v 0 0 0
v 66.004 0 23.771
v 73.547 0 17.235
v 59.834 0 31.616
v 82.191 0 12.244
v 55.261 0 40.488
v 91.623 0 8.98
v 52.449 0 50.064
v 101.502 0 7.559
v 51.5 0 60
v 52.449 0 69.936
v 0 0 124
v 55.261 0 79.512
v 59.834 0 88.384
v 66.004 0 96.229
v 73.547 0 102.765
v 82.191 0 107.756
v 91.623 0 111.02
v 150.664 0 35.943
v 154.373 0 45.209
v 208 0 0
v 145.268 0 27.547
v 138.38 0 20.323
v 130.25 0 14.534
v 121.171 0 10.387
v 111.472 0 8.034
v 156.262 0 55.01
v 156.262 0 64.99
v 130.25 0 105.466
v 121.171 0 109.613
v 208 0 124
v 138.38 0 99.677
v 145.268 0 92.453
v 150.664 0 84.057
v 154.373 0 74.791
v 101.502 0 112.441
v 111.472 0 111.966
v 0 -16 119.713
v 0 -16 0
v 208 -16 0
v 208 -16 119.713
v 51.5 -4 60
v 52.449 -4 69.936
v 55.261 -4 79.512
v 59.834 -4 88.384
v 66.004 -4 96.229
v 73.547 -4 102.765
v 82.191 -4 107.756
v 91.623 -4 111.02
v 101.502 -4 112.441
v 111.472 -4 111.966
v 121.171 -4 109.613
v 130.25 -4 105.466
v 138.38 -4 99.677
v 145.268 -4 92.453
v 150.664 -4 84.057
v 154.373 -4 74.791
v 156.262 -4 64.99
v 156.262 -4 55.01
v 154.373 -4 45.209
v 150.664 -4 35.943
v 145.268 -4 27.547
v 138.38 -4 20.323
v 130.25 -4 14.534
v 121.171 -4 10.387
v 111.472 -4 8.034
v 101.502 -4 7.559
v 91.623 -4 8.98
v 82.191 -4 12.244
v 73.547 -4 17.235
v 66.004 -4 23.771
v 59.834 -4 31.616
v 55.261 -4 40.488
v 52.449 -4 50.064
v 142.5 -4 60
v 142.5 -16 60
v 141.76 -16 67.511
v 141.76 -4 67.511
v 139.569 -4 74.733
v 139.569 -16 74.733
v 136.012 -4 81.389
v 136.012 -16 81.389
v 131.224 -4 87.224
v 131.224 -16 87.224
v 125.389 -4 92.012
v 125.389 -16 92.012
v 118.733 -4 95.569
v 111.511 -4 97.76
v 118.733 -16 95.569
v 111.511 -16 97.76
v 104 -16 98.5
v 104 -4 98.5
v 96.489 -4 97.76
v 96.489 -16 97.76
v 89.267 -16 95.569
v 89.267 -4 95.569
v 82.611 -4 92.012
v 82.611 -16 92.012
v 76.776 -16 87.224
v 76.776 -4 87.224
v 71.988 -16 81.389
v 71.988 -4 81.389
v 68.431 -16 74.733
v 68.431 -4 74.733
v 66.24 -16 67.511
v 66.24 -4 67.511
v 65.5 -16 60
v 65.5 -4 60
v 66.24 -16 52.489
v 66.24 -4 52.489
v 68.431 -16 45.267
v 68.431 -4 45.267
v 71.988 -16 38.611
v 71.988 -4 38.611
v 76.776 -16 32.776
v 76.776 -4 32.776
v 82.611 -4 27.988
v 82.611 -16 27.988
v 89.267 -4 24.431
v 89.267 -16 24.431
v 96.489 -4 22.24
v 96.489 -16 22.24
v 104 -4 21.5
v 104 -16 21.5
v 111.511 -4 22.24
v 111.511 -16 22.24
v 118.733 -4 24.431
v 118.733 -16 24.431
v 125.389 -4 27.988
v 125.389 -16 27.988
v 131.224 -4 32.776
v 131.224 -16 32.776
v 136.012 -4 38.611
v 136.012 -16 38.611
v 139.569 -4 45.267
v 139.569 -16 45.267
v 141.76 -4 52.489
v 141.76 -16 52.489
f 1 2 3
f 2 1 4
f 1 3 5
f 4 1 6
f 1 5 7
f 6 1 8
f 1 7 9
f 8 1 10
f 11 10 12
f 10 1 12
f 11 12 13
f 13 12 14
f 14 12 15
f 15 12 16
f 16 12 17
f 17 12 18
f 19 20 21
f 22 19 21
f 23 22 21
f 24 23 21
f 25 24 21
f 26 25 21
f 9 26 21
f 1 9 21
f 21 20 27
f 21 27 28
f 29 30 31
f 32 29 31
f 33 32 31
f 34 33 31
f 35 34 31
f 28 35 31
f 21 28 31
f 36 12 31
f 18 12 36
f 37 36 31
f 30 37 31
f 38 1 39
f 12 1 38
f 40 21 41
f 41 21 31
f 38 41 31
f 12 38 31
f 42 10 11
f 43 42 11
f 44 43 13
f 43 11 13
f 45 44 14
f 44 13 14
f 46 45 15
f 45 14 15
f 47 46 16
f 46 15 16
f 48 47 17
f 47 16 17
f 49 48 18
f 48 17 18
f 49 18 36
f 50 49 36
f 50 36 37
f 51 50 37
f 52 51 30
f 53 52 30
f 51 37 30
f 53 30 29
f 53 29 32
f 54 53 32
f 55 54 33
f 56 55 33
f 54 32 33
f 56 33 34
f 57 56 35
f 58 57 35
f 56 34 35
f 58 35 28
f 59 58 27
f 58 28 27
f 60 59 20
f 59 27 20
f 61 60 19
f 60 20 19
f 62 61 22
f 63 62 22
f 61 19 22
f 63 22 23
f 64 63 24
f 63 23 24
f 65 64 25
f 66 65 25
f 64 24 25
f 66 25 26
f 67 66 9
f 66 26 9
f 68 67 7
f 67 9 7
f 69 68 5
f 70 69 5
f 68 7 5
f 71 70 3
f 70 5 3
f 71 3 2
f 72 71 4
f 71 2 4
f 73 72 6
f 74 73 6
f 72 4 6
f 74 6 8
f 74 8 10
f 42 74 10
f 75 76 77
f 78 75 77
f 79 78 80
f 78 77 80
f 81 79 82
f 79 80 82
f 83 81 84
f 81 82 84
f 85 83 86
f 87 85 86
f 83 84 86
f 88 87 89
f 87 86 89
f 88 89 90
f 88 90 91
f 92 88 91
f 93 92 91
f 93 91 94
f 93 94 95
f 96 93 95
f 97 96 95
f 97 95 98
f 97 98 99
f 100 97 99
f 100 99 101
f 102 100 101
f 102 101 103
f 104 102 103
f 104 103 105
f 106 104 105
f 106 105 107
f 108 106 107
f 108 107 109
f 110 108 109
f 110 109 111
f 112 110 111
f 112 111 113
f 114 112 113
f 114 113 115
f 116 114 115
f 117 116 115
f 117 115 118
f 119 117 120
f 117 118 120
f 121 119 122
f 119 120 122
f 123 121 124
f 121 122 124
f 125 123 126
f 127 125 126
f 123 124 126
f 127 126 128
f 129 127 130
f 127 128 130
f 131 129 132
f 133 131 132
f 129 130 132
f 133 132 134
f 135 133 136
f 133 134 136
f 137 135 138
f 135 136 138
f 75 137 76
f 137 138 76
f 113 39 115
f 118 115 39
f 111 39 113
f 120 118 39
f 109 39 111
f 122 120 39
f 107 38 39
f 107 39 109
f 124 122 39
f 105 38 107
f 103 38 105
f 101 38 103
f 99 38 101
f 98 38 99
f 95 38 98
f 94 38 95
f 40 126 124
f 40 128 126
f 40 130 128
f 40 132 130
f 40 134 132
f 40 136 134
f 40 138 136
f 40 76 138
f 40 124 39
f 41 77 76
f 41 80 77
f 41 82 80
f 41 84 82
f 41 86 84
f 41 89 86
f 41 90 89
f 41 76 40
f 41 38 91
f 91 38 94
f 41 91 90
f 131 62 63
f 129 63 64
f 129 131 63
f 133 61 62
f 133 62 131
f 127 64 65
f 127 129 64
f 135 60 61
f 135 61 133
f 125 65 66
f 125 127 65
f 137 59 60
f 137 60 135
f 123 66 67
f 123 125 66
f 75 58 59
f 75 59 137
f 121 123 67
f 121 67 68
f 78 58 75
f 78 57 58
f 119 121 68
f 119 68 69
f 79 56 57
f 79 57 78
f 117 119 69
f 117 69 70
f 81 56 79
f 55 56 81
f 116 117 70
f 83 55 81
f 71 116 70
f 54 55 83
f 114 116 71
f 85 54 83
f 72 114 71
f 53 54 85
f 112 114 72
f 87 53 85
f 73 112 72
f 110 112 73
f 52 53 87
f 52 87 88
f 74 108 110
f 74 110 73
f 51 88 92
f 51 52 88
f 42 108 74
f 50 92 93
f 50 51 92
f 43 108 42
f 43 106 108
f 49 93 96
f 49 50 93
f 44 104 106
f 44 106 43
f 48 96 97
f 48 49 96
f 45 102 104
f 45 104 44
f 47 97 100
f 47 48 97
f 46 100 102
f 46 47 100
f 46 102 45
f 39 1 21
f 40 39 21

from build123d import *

# Parameters (mm, degrees)
F0_W     = 208
F0_H     = 124
F1_DEPTH = 16
F3_DEPTH = 240
F5_D     = 77
F6_R     = 52.5
F7_DEPTH = 4


with BuildPart() as f1:
    # F0 (on Front) → F1 (new body)
    with BuildSketch(Plane.XZ):
        with Locations((104, 62)):
            Rectangle(F0_W, F0_H)
    extrude(amount=F1_DEPTH)

    # F2 (on Right) → F3 (cut)
    with BuildSketch(Plane.YZ):
        Polygon((-16, 119.712813), (0, 124), (-16, 124), align=None)
    extrude(amount=F3_DEPTH, mode=Mode.SUBTRACT)

    # F5 (through all)
    with Locations(Plane(origin=(0, 0, 0), x_dir=(-1, 0, 0), z_dir=(0, 1, 0))):
        with Locations((-104, 60)):
            Hole(F5_D / 2)

    # F6 (on face) → F7 (cut)
    with BuildSketch(Plane(origin=(0, 0, 0), x_dir=(-1, 0, 0), z_dir=(0, 1, 0))):
        with Locations((-104, 60)):
            Circle(F6_R)
    extrude(amount=-F7_DEPTH, mode=Mode.SUBTRACT)


solid = f1.part
